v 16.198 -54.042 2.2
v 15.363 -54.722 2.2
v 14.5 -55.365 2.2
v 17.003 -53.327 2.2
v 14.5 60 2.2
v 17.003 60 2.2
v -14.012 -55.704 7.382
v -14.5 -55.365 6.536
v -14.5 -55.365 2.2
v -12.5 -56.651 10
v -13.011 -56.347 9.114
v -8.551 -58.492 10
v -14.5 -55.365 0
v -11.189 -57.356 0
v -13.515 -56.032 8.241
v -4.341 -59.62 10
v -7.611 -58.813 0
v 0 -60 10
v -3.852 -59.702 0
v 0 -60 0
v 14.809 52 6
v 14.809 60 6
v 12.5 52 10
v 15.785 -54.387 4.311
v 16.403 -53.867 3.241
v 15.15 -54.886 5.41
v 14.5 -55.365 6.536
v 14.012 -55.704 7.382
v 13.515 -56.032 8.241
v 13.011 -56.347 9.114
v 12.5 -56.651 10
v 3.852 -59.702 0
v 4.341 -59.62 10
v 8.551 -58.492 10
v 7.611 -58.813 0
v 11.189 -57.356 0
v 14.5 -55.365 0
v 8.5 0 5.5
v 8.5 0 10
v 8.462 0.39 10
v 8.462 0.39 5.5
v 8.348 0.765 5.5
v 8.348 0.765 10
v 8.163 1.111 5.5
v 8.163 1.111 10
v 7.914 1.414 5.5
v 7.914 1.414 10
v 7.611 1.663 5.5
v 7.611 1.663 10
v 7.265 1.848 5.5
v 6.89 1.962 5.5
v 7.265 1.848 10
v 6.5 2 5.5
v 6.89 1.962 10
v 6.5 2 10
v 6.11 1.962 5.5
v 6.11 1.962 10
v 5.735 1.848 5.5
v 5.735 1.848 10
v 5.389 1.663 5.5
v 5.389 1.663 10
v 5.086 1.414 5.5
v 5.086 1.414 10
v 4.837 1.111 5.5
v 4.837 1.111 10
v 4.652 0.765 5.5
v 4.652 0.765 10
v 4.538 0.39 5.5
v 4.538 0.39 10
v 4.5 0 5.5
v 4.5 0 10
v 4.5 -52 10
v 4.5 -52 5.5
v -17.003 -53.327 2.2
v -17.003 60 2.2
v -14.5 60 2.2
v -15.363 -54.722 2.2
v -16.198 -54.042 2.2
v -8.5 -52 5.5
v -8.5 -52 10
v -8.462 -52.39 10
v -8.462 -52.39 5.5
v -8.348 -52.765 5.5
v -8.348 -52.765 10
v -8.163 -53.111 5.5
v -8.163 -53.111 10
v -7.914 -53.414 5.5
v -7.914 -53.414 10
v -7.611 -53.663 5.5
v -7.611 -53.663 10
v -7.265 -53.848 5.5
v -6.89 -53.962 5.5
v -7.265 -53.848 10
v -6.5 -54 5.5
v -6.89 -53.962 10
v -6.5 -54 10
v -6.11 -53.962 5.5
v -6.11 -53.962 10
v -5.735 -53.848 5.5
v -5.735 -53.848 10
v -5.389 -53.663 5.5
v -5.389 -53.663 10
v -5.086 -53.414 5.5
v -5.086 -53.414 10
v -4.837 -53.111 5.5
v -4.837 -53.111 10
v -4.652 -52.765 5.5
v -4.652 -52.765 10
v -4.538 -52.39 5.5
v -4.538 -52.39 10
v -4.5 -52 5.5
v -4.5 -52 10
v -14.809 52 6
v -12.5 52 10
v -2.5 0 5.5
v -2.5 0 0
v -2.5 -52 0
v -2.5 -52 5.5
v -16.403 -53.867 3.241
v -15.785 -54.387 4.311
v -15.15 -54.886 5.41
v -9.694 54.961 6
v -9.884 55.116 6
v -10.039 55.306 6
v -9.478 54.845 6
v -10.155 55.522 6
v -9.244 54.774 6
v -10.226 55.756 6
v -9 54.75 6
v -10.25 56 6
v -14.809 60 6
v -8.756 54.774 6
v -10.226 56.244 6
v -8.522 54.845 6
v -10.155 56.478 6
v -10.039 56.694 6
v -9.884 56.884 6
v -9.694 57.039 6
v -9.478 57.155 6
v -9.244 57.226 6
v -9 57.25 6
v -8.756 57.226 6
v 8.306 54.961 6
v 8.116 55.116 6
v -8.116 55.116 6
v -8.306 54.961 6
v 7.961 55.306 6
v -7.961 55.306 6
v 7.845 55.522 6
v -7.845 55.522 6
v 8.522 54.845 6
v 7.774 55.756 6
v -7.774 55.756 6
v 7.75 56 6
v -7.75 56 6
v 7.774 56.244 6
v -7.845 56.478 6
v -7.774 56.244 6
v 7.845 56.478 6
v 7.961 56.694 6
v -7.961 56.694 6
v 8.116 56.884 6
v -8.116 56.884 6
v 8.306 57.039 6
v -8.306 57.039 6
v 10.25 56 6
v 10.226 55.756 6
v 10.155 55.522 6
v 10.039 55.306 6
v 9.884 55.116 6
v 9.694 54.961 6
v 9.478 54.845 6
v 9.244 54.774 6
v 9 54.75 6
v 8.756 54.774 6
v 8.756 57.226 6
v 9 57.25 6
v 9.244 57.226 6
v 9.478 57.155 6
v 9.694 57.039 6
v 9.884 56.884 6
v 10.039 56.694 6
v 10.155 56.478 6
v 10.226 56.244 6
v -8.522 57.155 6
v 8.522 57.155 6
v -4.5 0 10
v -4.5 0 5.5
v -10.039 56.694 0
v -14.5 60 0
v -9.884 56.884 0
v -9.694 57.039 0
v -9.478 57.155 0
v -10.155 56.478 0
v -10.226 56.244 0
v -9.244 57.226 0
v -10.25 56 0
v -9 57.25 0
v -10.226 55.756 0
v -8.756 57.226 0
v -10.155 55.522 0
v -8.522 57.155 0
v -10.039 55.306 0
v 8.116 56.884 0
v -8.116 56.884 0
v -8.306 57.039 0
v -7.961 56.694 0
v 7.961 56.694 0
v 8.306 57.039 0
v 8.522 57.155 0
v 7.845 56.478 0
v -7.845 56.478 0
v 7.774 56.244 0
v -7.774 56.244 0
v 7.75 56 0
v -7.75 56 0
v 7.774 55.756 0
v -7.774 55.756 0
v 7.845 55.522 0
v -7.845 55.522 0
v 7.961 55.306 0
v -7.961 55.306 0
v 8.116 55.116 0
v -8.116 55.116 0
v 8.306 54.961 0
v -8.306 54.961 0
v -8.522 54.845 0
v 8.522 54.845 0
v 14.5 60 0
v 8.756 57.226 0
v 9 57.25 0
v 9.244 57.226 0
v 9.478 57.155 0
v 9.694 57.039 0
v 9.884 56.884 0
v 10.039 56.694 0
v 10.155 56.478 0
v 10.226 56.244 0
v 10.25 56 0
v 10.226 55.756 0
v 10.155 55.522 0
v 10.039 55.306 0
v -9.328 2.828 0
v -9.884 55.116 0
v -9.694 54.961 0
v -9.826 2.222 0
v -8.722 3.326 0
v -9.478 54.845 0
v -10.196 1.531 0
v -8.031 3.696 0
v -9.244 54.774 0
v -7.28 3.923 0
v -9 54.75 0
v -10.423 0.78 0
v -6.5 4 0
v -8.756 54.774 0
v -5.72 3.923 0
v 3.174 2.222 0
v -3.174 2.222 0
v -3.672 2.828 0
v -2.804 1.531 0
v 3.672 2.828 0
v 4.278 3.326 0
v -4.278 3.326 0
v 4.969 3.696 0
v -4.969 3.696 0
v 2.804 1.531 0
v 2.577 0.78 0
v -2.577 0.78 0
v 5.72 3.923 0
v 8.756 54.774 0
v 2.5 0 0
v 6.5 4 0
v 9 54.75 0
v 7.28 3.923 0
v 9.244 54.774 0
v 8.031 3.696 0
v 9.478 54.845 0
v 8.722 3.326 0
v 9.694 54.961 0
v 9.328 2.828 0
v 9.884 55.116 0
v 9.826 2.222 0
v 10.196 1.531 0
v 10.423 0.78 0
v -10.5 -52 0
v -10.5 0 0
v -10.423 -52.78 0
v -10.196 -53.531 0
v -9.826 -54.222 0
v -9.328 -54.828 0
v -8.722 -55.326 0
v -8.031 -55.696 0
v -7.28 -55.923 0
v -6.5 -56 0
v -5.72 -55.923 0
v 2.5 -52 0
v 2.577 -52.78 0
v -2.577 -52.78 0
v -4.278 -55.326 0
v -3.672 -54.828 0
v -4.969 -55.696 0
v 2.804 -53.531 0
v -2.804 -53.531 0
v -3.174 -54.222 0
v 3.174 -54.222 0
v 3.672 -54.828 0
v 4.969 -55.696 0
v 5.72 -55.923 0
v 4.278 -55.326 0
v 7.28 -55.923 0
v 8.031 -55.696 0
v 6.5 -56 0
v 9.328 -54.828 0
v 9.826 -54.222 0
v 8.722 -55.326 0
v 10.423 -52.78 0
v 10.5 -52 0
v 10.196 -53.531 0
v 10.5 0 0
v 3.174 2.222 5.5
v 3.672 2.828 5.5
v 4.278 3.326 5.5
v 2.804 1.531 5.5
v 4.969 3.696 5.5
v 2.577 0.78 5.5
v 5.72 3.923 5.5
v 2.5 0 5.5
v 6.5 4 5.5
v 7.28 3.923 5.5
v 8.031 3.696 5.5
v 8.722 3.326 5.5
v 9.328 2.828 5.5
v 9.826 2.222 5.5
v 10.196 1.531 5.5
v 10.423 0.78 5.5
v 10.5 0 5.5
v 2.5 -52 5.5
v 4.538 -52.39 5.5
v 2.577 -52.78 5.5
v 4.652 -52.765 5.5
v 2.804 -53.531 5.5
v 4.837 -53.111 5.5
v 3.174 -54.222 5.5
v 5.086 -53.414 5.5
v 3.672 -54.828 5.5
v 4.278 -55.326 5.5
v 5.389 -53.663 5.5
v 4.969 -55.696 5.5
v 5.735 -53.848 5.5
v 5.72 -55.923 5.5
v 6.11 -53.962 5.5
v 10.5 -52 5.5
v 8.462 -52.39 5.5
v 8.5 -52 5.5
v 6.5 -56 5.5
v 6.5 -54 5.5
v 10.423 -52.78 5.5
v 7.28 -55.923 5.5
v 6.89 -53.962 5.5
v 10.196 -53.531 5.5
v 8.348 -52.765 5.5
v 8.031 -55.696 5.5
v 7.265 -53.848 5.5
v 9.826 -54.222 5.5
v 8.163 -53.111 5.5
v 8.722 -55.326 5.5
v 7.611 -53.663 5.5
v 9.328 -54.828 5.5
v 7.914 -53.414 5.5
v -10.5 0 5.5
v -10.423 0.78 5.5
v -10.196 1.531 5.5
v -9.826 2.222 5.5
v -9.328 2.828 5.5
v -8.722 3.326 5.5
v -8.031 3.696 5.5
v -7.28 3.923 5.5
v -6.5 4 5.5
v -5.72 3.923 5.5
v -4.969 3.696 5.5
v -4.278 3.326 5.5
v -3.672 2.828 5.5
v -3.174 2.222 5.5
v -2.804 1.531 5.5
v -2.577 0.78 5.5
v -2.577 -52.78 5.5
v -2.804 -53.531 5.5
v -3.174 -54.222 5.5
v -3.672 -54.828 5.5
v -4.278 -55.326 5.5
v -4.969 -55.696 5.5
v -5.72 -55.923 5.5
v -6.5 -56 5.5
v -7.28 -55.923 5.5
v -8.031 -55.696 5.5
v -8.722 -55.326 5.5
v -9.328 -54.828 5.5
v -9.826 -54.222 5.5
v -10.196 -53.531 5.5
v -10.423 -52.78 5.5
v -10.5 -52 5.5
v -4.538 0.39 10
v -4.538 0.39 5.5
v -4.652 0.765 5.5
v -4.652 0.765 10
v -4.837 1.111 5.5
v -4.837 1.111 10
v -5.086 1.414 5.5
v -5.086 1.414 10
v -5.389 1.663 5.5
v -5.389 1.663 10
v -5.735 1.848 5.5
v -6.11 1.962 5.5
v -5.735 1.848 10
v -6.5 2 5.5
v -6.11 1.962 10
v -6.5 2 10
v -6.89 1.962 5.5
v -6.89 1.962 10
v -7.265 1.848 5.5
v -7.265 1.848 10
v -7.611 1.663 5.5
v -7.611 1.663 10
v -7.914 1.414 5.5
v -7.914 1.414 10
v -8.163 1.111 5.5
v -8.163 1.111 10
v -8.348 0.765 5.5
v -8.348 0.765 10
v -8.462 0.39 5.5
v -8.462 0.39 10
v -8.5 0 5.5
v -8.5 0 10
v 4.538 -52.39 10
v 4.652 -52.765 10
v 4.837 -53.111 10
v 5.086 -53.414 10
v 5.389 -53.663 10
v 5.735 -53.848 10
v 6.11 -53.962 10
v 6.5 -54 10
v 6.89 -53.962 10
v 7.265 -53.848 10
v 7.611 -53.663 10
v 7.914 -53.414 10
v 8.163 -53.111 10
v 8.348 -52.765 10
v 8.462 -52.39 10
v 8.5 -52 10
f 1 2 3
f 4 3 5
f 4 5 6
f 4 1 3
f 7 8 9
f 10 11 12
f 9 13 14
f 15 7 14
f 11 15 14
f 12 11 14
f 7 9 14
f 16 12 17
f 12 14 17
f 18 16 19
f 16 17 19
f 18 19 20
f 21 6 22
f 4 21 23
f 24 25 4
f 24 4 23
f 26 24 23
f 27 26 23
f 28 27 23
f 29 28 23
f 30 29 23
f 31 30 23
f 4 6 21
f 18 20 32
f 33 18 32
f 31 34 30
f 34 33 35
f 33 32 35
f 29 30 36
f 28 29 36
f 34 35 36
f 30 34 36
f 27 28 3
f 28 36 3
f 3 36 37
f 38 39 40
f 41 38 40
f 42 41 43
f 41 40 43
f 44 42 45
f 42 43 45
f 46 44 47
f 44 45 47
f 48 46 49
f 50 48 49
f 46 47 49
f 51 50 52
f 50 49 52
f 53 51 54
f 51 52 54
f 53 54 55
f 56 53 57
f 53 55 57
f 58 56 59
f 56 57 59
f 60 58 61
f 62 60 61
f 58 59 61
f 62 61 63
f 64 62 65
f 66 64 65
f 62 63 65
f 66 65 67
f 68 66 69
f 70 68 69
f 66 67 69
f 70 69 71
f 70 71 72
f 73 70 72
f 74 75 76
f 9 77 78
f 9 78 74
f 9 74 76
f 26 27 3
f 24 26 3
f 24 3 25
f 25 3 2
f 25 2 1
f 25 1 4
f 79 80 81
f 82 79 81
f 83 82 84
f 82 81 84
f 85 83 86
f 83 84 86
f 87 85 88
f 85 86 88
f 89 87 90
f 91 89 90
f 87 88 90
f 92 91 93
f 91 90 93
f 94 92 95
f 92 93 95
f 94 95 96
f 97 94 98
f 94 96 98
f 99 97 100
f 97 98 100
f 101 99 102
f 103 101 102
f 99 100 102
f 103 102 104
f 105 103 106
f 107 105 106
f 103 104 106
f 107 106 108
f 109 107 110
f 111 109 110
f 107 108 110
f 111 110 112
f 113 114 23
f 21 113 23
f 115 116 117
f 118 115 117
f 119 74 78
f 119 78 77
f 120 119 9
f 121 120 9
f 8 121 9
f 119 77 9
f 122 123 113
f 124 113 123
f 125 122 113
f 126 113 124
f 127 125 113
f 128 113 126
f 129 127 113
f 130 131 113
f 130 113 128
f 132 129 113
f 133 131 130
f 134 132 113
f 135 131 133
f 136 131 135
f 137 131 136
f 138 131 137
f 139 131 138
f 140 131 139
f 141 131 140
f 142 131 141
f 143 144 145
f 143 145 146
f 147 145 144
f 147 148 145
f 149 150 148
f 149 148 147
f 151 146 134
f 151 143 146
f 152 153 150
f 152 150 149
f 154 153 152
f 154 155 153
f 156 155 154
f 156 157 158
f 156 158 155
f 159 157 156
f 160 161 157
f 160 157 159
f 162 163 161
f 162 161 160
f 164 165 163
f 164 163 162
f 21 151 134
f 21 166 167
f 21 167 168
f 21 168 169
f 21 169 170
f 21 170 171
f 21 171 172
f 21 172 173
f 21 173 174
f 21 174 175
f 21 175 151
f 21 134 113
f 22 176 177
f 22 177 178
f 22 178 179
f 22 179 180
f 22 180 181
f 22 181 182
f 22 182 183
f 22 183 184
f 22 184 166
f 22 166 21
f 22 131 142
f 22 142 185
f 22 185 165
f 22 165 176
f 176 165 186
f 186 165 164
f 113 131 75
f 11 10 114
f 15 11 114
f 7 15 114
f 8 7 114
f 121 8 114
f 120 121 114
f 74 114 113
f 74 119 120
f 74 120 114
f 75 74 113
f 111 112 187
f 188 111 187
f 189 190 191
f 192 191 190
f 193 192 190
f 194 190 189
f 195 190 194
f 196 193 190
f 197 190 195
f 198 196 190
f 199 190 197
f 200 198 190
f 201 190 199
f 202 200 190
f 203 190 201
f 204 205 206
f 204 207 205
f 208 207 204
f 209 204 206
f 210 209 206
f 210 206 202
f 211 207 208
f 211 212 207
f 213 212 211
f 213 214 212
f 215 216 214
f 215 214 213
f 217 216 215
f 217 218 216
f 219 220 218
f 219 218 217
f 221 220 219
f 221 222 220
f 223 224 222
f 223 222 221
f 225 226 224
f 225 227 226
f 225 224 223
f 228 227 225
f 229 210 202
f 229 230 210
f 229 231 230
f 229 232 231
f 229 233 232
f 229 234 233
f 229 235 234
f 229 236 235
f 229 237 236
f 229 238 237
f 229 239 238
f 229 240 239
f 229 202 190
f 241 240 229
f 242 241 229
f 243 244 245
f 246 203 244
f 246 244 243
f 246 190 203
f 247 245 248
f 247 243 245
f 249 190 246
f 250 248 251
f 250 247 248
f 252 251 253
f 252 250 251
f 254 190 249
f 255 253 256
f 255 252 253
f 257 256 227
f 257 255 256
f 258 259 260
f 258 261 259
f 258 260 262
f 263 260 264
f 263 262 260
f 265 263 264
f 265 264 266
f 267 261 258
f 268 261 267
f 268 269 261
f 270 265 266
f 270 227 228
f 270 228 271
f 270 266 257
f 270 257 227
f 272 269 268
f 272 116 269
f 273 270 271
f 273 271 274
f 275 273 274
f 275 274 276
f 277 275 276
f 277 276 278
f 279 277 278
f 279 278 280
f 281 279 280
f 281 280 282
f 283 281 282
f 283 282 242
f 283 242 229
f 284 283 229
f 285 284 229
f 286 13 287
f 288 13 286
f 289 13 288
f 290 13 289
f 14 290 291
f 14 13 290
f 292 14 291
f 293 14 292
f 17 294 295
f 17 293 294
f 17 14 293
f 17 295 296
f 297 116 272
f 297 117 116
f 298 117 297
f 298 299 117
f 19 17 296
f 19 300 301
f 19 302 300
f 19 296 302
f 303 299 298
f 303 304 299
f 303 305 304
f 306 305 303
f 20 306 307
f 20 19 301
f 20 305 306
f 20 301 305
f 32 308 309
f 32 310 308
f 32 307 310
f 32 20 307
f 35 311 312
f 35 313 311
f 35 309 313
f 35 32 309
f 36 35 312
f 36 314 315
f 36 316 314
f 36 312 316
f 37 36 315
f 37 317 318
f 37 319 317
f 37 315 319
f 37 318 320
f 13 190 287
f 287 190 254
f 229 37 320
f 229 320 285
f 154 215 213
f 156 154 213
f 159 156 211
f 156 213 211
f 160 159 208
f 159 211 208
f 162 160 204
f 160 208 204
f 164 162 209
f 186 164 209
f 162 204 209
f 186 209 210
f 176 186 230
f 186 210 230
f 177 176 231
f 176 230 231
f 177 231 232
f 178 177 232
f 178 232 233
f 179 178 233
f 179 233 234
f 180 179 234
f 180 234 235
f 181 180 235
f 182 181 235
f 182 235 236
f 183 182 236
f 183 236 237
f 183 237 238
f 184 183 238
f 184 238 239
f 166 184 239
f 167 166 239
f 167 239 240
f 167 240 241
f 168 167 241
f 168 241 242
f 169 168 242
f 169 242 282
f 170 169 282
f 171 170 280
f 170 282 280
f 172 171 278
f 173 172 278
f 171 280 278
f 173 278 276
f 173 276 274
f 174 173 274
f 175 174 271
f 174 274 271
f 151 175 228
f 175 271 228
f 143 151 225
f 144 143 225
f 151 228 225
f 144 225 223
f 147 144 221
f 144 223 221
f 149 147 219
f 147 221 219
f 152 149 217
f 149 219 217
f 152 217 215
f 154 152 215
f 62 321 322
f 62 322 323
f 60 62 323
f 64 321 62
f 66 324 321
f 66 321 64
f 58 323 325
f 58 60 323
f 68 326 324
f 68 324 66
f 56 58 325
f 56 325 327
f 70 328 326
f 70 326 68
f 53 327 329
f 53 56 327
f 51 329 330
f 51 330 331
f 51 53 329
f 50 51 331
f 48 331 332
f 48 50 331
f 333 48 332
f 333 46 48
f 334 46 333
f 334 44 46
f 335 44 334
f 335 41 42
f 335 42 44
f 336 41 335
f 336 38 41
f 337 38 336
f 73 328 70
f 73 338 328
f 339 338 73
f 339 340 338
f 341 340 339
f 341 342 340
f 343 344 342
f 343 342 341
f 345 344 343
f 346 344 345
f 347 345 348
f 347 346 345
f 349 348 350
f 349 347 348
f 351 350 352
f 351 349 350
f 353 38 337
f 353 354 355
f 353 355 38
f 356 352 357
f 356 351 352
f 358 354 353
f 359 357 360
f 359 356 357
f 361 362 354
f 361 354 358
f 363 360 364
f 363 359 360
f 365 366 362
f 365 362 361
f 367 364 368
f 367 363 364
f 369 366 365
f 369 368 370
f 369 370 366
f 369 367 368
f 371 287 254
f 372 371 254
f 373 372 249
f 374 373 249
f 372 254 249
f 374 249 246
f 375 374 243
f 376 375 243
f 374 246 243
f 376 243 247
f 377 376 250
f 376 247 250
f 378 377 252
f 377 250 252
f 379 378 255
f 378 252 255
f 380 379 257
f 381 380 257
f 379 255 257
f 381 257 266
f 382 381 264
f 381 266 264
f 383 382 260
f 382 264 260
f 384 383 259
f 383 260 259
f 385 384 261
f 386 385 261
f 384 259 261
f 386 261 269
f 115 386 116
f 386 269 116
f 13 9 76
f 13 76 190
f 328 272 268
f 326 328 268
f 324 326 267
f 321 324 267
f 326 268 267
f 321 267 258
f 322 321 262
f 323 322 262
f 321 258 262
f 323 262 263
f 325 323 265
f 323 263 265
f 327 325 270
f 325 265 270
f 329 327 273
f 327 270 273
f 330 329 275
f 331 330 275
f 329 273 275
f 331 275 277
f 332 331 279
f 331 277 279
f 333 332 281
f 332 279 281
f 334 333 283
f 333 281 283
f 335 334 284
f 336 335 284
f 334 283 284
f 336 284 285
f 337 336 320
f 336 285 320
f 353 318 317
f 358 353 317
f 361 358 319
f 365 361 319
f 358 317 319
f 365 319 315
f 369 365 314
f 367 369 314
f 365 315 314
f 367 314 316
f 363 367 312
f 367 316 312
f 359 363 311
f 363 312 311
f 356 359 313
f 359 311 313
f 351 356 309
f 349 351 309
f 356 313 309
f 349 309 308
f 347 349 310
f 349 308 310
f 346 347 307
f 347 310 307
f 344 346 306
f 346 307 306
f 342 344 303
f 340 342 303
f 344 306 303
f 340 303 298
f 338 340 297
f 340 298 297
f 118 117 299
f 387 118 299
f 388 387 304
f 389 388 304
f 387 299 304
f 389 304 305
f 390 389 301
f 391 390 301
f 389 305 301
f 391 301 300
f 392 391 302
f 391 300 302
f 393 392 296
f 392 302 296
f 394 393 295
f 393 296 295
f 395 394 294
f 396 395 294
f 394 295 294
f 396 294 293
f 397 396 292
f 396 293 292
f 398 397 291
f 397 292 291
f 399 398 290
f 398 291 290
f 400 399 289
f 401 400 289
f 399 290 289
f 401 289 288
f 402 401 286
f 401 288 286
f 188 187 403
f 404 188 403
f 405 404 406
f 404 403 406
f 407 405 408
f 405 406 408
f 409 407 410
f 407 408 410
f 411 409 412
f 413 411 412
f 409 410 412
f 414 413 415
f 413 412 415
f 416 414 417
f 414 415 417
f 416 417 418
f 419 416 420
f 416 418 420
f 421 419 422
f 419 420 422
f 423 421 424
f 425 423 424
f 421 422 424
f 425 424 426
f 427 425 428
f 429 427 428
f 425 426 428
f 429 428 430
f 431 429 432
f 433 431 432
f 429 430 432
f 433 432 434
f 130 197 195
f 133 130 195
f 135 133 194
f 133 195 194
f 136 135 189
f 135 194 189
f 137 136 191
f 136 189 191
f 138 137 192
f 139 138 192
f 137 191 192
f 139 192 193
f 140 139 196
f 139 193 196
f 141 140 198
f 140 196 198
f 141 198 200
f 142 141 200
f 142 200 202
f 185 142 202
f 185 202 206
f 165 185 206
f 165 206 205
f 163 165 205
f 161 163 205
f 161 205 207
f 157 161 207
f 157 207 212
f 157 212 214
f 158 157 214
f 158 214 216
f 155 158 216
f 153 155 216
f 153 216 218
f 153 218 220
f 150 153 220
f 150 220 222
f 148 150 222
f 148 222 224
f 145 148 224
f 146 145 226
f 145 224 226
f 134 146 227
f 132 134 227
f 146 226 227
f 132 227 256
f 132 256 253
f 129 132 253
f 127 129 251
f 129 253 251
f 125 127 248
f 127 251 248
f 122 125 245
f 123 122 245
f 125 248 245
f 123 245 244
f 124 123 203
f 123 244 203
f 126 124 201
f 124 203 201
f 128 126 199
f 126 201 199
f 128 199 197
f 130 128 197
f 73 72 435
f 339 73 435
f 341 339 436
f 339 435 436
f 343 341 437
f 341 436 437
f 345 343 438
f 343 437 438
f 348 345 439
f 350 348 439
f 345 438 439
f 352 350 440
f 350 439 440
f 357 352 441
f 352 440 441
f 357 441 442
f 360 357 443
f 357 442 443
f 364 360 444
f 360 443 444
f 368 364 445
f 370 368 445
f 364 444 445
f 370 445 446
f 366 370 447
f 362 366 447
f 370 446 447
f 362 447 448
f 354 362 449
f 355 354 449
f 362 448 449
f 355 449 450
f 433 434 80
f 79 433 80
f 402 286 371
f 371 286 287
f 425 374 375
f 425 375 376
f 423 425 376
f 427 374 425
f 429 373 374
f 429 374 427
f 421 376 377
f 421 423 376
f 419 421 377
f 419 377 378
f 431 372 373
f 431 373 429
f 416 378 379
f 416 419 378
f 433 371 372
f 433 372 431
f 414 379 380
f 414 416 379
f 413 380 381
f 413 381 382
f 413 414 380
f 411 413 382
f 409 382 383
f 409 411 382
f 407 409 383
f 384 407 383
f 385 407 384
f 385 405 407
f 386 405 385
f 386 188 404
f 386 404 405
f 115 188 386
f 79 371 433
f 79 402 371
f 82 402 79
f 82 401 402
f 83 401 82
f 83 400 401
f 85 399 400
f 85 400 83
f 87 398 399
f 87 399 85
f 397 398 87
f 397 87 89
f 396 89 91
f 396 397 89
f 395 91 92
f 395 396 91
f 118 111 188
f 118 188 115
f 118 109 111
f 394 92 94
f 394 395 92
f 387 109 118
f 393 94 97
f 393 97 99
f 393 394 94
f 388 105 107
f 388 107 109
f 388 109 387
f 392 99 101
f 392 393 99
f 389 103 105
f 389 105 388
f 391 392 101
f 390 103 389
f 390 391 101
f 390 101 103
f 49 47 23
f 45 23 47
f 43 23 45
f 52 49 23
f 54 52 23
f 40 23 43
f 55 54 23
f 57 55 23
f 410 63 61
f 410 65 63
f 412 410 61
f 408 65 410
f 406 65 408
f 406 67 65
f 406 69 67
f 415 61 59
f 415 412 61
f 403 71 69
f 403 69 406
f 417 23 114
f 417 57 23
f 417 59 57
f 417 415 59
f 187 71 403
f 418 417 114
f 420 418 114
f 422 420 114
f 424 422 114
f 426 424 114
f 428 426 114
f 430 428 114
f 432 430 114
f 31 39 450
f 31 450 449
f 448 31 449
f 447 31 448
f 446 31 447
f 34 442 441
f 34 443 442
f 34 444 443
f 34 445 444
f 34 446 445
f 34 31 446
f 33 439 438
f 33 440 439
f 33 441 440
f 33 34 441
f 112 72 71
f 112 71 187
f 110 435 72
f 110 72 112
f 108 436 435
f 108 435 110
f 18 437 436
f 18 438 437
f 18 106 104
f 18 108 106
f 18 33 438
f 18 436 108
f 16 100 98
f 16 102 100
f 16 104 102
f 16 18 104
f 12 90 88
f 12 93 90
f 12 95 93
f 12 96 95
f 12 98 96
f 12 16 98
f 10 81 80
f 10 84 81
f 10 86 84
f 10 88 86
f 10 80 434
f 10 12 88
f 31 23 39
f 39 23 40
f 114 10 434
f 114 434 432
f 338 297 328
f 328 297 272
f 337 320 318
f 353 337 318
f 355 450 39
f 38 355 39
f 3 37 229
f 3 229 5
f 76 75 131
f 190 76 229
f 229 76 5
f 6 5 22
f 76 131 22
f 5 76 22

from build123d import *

# Parameters (mm, degrees)
F1_DEPTH = 60
F3_DEPTH = 25
F5_DEPTH = 5.5
F7_DEPTH = 25
F9_DEPTH = 4
F11_D    = 2.5


with BuildPart() as f1:
    # F0 (on Front) → F1 (new body, symmetric)
    with BuildSketch(Plane.XZ):
        Polygon((-14.5, 2.2), (-14.5, 0), (14.5, 0), (14.5, 2.2), (17.0033320997, 2.2), (12.5, 10), (-12.5, 10), (-17.0033320997, 2.2), align=None)
    extrude(amount=F1_DEPTH, both=True)

    # F2 (on face) → F3 (cut)
    with BuildSketch(Plane.XY.offset(10)):
        with BuildLine():
            ThreePointArc((-4.5, 0), (-6.5, 2), (-8.5, 0))
            Line((-8.5, 0), (-8.5, -52))
            ThreePointArc((-8.5, -52), (-6.5, -54), (-4.5, -52))
            Line((-4.5, -52), (-4.5, 0))
        make_face()
        with BuildLine():
            ThreePointArc((8.5, 0), (6.5, 2), (4.5, 0))
            Line((4.5, 0), (4.5, -52))
            ThreePointArc((4.5, -52), (6.5, -54), (8.5, -52))
            Line((8.5, -52), (8.5, 0))
        make_face()
    extrude(amount=-F3_DEPTH, mode=Mode.SUBTRACT)

    # F4 (on face) → F5 (cut)
    with BuildSketch(Plane(origin=(0, 0, 0), x_dir=(1, 0, 0), z_dir=(0, 0, -1))):
        with BuildLine():
            ThreePointArc((-10.5, 0), (-6.5, -4), (-2.5, 0))
            Line((-2.5, 0), (-2.5, 52))
            ThreePointArc((-2.5, 52), (-6.5, 56), (-10.5, 52))
            Line((-10.5, 52), (-10.5, 0))
        make_face()
        with BuildLine():
            ThreePointArc((-4.5, 0), (-6.5, -2), (-8.5, 0))
            Line((-8.5, 0), (-8.5, 52))
            ThreePointArc((-8.5, 52), (-6.5, 54), (-4.5, 52))
            Line((-4.5, 52), (-4.5, 0))
        make_face(mode=Mode.SUBTRACT)
        with BuildLine():
            ThreePointArc((2.5, 0), (6.5, -4), (10.5, 0))
            Line((10.5, 0), (10.5, 52))
            ThreePointArc((10.5, 52), (6.5, 56), (2.5, 52))
            Line((2.5, 52), (2.5, 0))
        make_face()
        with BuildLine():
            ThreePointArc((4.5, 52), (6.5, 54), (8.5, 52))
            Line((8.5, 52), (8.5, 0))
            ThreePointArc((8.5, 0), (6.5, -2), (4.5, 0))
            Line((4.5, 0), (4.5, 52))
        make_face(mode=Mode.SUBTRACT)
    extrude(amount=-F5_DEPTH, mode=Mode.SUBTRACT)

    # F6 (on face) → F7 (cut)
    with BuildSketch(Plane(origin=(0, 0, 0), x_dir=(1, 0, 0), z_dir=(0, 0, -1))):
        with BuildLine():
            ThreePointArc((0, 60), (7.6113304895, 58.8131822355), (14.5, 55.3654118544))
            Line((14.5, 55.3654118544), (14.5, 60))
            Line((14.5, 60), (0, 60))
        make_face()
        with BuildLine():
            ThreePointArc((-14.5, 55.3654118544), (-7.6113304895, 58.8131822355), (0, 60))
            Line((0, 60), (-14.5, 60))
            Line((-14.5, 60), (-14.5, 55.3654118544))
        make_face()
        with BuildLine():
            ThreePointArc((14.5, 55.3654118544), (18.1961519016, 52.1435135248), (21.1923439056, 48.2621476311))
            Line((21.1923439056, 48.2621476311), (21.1923439056, 66.2593638897))
            Line((21.1923439056, 66.2593638897), (-20.7064654678, 66.2593638897))
            Line((-20.7064654678, 66.2593638897), (-20.7064654678, 49.0086504643))
            ThreePointArc((-20.7064654678, 49.0086504643), (-17.8878703743, 52.4649389771), (-14.5, 55.3654118544))
            Line((-14.5, 55.3654118544), (-14.5, 60))
            Line((-14.5, 60), (0, 60))
            Line((0, 60), (14.5, 60))
            Line((14.5, 60), (14.5, 55.3654118544))
        make_face()
    extrude(amount=-F7_DEPTH, mode=Mode.SUBTRACT)

    # F8 (on face) → F9 (cut)
    with BuildSketch(Plane.XY.offset(10)):
        Polygon((12.5, 60), (-12.5, 60), (-26.1883419007, 60), (-26.1883419007, 52), (21.1705399538, 52), (21.1705399538, 60), align=None)
    extrude(amount=-F9_DEPTH, mode=Mode.SUBTRACT)

    # F11 (through all)
    with Locations(Plane.XY.offset(6)):
        with Locations((9, 56), (-9, 56)):
            Hole(F11_D / 2)


solid = f1.part
